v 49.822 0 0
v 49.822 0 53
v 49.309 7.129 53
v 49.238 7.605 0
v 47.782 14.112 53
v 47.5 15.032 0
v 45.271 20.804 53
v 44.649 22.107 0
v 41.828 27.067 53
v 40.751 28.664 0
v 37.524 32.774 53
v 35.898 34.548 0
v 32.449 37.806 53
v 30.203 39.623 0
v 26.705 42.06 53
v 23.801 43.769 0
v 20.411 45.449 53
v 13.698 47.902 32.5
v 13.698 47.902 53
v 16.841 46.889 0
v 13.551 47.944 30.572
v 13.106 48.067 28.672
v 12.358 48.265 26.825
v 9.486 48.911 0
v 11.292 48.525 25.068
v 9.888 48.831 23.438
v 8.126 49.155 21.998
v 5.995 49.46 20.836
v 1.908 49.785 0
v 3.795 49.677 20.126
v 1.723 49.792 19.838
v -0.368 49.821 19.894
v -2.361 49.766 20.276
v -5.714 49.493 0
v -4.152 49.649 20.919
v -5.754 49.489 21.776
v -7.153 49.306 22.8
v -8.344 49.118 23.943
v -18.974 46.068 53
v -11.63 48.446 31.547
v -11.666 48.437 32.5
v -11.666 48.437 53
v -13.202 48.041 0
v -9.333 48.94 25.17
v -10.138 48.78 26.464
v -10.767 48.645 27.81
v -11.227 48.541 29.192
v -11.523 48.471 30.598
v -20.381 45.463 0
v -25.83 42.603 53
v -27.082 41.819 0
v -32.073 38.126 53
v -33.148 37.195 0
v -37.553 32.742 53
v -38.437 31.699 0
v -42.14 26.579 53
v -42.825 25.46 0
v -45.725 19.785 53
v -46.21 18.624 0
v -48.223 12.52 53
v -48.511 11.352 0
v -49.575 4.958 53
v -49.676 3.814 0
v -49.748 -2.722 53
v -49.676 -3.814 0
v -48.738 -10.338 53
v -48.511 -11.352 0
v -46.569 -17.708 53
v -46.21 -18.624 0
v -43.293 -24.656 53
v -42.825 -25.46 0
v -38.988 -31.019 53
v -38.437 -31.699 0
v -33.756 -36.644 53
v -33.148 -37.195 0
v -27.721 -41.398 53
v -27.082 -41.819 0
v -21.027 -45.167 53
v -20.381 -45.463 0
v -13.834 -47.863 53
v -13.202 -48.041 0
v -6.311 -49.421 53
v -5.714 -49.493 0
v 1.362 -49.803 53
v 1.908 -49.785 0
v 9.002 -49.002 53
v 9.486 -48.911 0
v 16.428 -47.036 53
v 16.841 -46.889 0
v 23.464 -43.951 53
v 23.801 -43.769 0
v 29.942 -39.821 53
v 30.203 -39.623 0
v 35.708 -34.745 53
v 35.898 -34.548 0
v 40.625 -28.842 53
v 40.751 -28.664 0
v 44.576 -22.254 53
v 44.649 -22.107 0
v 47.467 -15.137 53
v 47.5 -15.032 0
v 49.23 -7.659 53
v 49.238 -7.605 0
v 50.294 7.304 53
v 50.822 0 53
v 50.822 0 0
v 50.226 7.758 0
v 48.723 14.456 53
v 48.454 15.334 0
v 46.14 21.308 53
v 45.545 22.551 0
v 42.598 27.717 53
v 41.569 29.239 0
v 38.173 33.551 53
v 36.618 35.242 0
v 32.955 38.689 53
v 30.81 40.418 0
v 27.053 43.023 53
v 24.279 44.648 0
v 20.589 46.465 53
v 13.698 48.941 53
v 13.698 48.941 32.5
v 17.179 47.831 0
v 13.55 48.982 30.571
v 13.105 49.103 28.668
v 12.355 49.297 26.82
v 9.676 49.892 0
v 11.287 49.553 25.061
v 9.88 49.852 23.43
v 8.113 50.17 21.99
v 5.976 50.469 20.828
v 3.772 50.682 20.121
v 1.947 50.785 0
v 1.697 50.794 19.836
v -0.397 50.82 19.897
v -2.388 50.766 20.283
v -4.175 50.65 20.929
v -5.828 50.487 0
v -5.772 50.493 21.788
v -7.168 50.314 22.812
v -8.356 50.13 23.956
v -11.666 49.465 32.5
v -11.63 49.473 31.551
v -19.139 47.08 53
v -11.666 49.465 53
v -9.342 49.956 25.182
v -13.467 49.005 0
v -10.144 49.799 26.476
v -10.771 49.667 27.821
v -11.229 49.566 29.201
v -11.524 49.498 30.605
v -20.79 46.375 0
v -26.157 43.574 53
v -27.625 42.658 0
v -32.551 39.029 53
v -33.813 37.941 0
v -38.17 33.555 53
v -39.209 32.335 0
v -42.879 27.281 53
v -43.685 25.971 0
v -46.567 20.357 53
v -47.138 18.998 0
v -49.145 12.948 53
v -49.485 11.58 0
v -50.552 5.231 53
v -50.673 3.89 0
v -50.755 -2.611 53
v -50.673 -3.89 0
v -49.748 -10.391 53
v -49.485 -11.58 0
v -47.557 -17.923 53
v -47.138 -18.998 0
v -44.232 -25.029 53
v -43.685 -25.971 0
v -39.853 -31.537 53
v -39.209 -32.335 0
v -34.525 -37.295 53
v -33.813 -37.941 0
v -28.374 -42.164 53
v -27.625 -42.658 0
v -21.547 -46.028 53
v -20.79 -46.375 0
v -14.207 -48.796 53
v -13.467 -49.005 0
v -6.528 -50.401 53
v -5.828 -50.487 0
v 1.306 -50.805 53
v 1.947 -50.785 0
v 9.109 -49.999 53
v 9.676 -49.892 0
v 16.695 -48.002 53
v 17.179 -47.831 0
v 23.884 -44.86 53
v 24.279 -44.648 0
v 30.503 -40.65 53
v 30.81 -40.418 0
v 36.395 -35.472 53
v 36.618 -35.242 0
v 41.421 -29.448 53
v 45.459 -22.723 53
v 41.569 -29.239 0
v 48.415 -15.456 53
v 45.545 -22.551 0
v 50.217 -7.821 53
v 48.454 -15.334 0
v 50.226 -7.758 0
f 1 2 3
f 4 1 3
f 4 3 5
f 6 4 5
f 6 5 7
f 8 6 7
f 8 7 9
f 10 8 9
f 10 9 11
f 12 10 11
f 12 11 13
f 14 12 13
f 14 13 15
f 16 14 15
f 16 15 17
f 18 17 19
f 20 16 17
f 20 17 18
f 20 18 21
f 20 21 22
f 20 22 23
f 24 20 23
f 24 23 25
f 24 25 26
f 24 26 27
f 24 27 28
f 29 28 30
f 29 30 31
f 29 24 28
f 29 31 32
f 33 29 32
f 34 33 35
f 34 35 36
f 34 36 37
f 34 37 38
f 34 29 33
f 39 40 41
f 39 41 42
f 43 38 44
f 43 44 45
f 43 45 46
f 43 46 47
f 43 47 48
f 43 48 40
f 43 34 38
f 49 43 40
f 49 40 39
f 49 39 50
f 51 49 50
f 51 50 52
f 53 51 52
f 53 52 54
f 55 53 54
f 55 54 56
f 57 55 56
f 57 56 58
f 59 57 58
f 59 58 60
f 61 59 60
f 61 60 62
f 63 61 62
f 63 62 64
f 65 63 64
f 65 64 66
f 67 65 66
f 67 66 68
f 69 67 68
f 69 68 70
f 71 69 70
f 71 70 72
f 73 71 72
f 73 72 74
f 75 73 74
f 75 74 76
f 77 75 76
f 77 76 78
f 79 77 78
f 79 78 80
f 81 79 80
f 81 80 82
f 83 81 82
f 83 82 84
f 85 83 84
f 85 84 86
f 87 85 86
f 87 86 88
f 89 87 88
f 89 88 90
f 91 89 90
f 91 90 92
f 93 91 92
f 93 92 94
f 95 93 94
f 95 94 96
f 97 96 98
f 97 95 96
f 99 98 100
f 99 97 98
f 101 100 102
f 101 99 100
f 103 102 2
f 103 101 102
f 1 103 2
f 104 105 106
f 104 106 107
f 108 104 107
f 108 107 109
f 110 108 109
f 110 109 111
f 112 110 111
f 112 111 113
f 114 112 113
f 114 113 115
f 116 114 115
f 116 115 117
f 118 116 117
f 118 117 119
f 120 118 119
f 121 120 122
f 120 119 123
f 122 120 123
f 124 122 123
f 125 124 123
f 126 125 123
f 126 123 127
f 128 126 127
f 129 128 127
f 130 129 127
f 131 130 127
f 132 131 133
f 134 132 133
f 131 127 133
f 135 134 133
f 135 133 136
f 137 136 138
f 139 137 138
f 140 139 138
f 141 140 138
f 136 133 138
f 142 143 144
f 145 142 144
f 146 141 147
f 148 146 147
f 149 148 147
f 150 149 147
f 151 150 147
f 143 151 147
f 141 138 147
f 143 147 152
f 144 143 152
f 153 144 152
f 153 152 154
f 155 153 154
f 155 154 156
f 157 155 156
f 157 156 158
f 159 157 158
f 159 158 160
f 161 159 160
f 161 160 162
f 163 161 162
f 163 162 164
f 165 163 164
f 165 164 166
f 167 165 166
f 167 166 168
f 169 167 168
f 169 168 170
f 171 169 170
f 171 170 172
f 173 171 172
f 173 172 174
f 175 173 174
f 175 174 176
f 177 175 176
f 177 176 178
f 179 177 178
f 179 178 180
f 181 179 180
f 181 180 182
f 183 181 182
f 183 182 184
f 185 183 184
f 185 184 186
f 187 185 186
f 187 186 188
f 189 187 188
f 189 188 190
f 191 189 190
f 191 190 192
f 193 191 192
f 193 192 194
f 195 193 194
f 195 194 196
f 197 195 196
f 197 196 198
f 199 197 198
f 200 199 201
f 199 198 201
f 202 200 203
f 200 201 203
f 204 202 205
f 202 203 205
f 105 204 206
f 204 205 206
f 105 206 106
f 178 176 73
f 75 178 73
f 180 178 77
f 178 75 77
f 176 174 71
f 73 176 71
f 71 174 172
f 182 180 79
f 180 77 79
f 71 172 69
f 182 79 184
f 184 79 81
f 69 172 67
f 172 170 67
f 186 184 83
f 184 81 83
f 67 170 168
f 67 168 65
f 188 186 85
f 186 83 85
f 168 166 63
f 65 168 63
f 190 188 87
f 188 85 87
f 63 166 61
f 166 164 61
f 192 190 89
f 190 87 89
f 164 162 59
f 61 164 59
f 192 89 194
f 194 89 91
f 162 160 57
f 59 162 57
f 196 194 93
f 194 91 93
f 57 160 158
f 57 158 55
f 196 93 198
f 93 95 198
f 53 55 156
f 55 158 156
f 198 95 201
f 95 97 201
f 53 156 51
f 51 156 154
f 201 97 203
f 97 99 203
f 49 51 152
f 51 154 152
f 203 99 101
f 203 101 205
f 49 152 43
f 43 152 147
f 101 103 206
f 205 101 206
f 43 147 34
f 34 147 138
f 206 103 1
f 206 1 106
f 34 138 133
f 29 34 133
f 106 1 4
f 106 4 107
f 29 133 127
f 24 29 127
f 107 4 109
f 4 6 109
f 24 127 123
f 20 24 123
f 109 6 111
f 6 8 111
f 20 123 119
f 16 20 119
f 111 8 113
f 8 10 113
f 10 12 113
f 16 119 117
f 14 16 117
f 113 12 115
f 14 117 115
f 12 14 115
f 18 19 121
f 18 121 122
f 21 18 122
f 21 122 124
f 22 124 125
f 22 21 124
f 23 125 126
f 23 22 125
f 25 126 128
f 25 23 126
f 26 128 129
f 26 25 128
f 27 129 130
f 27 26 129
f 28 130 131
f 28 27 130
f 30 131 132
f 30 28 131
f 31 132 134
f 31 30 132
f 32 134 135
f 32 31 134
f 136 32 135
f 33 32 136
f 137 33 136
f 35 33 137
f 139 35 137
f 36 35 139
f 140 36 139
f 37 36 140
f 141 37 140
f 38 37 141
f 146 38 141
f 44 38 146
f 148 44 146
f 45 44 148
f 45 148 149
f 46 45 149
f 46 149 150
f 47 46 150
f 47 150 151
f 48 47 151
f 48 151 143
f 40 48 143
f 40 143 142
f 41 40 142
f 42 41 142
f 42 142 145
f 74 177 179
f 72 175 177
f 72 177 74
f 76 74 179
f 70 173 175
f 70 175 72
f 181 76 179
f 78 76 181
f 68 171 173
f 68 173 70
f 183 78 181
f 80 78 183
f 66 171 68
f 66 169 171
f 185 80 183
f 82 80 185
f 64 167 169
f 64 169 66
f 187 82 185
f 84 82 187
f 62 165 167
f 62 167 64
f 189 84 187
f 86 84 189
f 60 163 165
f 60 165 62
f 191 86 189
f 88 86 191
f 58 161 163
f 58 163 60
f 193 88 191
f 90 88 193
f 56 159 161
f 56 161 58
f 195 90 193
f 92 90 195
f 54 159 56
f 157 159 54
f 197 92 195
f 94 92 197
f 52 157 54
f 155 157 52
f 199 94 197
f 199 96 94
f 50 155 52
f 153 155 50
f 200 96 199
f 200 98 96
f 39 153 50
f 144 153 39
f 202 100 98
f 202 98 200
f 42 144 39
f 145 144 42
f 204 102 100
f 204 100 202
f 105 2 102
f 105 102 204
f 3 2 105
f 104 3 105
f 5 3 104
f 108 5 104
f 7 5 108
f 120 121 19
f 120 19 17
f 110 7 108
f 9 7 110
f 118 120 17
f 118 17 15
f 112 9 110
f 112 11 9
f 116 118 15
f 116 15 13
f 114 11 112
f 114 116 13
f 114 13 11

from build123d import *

# Parameters (mm, degrees)
SKETCH1_R           = 50.822
SKETCH1_R_2         = 49.822
BOSS_EXTRUDE1_DEPTH = 53
CUT_EXTRUDE1_DEPTH  = 90.301463415


with BuildPart() as part:
    # Sketch1 → Boss-Extrude1 (new body)
    with BuildSketch(Plane.XY):
        Circle(SKETCH1_R)
        Circle(SKETCH1_R_2, mode=Mode.SUBTRACT)
    extrude(amount=BOSS_EXTRUDE1_DEPTH)

    # Sketch2 → Cut-Extrude1 (cut, through all)
    with BuildSketch(Plane(origin=(0, 0, 0), x_dir=(1, 0, 0), z_dir=(0, 1, 0))):
        with BuildLine():
            Line((-11.666, -32.5), (-11.666, -53))
            Line((-11.666, -53), (13.698, -53))
            Line((13.698, -53), (13.698, -32.5))
            ThreePointArc((13.698, -32.5), (1.016, -19.818), (-11.666, -32.5))
        make_face()
    extrude(amount=CUT_EXTRUDE1_DEPTH, mode=Mode.SUBTRACT)


solid = part.part
